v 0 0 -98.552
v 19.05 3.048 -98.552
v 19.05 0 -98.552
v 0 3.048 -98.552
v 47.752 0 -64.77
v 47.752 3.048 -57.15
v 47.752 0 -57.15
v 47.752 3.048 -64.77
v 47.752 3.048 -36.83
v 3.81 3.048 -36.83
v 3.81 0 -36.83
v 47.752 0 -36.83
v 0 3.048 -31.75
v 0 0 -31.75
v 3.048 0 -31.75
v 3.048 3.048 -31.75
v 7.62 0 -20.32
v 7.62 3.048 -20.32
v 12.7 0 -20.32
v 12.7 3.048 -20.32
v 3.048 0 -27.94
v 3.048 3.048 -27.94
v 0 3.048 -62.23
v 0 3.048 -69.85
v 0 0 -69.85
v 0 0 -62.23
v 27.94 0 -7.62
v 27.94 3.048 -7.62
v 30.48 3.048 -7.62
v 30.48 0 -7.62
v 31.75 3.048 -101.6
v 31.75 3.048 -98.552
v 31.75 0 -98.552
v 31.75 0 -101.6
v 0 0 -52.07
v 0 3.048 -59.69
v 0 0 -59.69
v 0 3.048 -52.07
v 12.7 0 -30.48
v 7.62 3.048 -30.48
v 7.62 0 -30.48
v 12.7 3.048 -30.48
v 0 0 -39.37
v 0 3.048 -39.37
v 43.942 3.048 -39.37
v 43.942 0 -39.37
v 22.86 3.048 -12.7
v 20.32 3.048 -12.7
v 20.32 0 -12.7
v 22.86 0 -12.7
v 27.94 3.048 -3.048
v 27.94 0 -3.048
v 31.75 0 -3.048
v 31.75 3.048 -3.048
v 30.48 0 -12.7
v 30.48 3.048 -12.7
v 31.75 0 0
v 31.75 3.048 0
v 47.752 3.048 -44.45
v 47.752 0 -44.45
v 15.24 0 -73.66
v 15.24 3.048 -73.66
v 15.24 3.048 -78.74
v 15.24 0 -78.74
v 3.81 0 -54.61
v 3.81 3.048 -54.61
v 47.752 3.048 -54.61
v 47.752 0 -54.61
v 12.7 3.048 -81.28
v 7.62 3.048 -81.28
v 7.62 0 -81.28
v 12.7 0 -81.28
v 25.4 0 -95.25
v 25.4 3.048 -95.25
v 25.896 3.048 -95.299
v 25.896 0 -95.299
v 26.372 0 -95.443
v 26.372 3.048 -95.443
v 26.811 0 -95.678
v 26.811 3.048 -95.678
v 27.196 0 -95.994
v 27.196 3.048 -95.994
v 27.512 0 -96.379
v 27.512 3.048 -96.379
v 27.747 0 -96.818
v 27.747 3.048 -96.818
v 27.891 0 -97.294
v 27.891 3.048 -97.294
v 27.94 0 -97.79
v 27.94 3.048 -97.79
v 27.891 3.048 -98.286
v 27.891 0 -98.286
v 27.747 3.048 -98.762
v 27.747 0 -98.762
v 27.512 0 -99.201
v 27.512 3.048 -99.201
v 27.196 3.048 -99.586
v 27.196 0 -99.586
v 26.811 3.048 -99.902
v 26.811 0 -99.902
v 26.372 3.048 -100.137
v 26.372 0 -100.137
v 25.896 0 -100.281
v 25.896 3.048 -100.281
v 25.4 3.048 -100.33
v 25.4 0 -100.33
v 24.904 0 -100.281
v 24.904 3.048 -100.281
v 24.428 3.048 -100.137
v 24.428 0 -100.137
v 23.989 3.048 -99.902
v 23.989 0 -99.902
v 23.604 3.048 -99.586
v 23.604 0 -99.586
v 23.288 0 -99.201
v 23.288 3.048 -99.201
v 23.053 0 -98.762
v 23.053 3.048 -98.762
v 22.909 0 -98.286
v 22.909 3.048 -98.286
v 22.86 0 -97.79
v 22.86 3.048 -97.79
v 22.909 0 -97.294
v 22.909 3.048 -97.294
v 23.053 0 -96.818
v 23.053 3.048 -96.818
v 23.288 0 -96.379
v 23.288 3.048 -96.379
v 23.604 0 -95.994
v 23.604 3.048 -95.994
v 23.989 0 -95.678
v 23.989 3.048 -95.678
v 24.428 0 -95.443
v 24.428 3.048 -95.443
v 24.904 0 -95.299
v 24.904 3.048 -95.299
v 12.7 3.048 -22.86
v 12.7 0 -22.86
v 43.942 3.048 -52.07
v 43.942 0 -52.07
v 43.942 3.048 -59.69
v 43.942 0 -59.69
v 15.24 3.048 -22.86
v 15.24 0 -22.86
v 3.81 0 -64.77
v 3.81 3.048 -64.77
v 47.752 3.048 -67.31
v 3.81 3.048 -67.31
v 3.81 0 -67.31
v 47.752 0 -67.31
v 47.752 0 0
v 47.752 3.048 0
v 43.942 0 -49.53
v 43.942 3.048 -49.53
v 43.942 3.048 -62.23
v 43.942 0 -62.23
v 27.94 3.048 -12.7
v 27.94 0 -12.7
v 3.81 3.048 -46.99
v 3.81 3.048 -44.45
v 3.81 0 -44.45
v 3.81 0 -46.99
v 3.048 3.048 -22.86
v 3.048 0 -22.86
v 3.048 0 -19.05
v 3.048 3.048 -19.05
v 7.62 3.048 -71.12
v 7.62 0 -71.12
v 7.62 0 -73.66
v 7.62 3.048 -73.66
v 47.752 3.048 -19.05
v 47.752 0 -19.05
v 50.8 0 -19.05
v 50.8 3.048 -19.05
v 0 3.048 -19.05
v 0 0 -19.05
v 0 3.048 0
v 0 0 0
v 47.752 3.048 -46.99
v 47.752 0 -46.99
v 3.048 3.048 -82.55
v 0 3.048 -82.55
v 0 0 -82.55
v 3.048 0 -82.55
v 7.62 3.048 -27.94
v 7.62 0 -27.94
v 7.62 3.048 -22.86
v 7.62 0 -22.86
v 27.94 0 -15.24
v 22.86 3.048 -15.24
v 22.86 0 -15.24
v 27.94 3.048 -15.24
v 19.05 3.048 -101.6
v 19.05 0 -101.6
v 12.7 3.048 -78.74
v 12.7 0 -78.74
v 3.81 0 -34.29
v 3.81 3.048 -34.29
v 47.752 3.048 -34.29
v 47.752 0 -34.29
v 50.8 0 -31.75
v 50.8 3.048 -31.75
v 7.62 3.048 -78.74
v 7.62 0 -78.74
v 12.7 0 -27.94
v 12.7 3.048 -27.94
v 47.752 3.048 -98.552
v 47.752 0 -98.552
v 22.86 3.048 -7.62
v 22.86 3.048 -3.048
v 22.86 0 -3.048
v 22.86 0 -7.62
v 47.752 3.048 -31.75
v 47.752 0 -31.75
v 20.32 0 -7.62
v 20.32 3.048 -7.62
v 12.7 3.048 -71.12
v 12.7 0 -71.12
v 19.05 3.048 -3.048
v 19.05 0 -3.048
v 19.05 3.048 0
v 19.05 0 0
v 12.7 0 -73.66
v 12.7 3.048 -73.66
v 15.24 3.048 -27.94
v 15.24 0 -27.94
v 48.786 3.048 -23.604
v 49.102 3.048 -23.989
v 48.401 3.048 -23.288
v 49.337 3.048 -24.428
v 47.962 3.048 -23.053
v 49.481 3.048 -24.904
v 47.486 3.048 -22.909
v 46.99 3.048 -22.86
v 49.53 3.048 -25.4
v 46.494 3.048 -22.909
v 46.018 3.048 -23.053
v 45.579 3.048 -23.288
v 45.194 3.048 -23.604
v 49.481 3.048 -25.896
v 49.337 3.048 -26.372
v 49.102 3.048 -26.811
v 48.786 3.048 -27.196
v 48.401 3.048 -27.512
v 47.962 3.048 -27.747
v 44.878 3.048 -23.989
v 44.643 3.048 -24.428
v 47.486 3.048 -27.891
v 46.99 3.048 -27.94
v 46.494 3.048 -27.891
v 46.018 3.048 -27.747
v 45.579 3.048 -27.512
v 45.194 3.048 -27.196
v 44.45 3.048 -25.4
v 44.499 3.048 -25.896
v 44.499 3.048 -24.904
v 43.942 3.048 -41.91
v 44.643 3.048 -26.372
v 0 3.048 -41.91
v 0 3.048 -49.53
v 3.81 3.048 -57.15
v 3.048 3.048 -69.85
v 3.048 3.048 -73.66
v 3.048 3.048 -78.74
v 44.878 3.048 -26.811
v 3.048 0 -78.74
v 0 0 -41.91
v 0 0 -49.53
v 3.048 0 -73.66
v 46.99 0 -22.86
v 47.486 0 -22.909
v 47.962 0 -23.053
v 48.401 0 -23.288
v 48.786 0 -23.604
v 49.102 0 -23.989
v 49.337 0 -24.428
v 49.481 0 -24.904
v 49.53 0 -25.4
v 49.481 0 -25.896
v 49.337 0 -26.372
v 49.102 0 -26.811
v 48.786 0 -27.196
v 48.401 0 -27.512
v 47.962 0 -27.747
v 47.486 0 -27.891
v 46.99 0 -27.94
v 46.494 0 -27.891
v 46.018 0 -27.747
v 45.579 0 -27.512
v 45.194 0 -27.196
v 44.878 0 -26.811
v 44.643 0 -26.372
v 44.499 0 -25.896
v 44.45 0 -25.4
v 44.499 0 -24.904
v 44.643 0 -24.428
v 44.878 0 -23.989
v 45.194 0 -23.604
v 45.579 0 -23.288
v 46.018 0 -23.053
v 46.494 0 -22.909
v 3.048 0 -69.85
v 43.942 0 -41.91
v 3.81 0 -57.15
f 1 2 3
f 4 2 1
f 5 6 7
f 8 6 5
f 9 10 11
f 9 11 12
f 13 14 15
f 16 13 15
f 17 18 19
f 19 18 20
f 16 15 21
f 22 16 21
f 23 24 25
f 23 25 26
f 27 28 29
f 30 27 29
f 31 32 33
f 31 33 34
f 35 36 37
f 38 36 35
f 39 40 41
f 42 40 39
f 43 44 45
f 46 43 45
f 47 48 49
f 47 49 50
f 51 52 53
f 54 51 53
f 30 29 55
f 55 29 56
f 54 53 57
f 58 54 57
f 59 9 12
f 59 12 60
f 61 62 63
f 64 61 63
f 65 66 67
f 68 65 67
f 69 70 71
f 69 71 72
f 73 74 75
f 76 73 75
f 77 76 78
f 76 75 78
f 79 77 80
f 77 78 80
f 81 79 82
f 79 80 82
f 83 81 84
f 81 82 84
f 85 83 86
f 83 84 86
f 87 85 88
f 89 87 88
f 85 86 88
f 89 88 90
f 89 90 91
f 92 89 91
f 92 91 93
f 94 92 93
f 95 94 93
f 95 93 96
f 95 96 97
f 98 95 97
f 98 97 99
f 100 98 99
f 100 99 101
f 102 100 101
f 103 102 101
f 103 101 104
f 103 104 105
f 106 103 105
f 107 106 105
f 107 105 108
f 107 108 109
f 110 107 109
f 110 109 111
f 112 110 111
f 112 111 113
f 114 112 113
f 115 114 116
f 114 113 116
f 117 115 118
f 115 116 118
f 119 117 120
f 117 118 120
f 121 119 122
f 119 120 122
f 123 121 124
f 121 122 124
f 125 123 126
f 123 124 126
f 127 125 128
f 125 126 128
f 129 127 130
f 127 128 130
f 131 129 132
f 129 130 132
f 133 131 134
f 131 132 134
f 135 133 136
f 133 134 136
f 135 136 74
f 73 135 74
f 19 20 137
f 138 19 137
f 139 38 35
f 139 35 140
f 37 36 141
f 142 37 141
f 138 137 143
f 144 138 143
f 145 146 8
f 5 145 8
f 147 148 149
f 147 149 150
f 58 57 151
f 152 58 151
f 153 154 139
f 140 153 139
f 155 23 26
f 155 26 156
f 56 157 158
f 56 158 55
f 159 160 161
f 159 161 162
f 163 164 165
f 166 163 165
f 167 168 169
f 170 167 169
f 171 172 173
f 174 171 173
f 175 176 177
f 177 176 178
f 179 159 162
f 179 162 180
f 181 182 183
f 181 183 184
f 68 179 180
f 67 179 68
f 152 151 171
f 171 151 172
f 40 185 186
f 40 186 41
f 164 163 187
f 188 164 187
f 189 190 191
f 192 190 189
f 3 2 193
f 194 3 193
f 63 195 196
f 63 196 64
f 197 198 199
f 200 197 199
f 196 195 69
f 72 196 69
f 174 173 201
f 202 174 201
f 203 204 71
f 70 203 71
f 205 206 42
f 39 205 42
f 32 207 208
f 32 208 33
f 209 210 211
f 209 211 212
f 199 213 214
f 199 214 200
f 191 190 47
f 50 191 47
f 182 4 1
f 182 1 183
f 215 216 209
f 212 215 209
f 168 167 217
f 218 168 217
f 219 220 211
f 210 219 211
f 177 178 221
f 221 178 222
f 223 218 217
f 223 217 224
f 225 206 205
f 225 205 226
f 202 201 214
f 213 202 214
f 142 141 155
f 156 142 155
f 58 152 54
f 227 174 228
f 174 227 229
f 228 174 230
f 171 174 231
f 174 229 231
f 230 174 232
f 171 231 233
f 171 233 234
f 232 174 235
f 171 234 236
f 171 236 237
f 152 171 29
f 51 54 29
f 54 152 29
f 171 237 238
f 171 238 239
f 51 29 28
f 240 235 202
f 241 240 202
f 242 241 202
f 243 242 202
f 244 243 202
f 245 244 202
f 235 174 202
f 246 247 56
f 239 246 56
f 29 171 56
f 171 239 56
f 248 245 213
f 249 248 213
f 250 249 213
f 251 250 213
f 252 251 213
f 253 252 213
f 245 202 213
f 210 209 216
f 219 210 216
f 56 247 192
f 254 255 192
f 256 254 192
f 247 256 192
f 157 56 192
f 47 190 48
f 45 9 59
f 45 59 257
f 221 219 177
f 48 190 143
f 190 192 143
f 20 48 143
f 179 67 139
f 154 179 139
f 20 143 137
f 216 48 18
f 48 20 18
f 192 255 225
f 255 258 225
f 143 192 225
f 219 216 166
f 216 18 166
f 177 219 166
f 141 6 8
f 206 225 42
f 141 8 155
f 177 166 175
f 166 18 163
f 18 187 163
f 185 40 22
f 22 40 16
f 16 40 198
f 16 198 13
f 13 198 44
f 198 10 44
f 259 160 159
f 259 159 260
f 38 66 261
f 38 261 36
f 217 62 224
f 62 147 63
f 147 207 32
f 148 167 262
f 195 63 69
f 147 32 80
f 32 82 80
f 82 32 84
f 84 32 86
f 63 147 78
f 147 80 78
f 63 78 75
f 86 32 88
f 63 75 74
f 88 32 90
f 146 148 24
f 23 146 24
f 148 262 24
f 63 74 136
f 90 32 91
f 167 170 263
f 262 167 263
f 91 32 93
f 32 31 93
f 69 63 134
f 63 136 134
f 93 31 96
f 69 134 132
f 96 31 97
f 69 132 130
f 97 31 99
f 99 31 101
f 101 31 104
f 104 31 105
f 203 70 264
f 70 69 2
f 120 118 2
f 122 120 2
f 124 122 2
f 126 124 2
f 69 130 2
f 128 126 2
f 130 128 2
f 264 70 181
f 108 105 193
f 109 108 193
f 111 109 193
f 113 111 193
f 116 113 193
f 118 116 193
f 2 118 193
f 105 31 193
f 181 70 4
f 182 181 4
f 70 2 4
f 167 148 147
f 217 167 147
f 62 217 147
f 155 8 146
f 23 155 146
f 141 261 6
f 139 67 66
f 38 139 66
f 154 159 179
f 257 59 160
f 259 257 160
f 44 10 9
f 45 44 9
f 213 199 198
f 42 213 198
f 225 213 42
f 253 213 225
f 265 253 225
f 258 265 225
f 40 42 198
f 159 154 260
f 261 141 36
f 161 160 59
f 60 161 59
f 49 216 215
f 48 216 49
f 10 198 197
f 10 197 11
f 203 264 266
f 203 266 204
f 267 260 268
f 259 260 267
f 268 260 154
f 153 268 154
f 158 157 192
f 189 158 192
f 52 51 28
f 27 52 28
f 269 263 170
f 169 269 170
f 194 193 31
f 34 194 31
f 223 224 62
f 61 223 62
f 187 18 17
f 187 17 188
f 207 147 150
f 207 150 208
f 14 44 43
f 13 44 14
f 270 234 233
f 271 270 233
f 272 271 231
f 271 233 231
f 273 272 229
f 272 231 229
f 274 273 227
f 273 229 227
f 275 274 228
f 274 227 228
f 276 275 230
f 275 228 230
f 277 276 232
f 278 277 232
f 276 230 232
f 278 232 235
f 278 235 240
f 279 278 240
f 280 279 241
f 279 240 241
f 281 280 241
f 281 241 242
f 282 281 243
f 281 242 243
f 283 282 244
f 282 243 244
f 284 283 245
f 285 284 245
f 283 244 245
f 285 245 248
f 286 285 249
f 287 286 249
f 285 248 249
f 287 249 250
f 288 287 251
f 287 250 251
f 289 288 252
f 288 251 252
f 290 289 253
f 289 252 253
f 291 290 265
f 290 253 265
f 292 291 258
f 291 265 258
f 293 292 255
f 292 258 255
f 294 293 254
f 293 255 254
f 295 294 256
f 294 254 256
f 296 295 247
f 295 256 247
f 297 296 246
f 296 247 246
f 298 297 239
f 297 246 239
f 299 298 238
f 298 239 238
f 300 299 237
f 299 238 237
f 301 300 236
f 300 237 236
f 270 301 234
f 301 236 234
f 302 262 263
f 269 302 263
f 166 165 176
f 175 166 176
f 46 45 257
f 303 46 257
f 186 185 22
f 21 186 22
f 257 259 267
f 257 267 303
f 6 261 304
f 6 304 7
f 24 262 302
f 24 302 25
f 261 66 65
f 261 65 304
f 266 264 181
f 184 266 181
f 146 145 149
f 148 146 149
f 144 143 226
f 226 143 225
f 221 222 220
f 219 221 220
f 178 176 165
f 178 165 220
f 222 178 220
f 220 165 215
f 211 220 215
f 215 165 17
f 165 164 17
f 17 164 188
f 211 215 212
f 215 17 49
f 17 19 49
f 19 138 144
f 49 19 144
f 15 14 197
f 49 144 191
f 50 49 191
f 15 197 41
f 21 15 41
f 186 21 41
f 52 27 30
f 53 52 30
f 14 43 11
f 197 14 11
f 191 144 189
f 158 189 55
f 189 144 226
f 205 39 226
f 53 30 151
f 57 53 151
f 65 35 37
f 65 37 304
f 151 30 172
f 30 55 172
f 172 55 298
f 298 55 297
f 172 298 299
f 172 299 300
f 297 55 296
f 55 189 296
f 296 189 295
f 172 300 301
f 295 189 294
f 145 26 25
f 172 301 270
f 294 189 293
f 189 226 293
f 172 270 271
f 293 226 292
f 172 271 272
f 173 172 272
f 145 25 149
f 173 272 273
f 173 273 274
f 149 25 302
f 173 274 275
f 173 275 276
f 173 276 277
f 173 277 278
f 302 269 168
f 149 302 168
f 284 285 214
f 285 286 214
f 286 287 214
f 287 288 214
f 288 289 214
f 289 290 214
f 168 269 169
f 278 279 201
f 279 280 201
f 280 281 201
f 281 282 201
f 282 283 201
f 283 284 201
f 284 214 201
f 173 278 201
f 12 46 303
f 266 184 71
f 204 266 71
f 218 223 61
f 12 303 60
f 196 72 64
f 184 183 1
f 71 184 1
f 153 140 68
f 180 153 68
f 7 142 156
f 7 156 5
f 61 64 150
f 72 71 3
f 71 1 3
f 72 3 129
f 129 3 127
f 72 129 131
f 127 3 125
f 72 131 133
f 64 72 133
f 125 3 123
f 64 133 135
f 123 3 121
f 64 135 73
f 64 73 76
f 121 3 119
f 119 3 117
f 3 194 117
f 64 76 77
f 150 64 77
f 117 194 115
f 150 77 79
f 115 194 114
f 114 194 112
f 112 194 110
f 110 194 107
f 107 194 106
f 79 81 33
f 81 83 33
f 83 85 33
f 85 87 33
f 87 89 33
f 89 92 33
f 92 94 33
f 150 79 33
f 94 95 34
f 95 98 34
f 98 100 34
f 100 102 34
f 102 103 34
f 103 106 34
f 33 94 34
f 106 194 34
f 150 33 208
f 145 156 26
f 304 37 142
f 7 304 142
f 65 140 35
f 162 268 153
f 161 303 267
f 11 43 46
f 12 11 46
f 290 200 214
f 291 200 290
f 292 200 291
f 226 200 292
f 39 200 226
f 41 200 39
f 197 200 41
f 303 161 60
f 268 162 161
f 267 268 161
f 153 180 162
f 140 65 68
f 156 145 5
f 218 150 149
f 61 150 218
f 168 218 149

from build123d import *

# Parameters (mm, degrees)
BOSS_EXTRUDE1_DEPTH = 3.048
SKETCH2_W           = 4.572
SKETCH2_H           = 5.08
SKETCH2_W_2         = 5.08
SKETCH2_H_2         = 2.54
SKETCH2_W_3         = 2.54
SKETCH2_H_3         = 4.572
SKETCH2_R           = 2.54
CUT_EXTRUDE1_DEPTH  = 3.048
SKETCH3_W           = 12.7
SKETCH3_H           = 3.048
SKETCH3_W_2         = 44.704
SKETCH3_H_2         = 12.7
BOSS_EXTRUDE2_DEPTH = 3.048
BOSS_EXTRUDE3_START = -3.048
SKETCH4_R           = 2.54
BOSS_EXTRUDE3_DEPTH = 3.048
SKETCH5_R           = 2.54
SKETCH5_W           = 5.08
SKETCH5_H           = 2.54
SKETCH5_W_2         = 4.572
SKETCH5_H_2         = 5.08
SKETCH5_W_3         = 2.54
SKETCH5_W_4         = 43.942
CUT_EXTRUDE2_DEPTH  = 114.63313911


with BuildPart() as part:
    # Sketch1 → Boss-Extrude1 (new body)
    with BuildSketch(Plane(origin=(0, 0, 0), x_dir=(1, 0, 0), z_dir=(0, 1, 0))):
        Polygon((0, 19.05), (0, 0), (19.05, 0), (19.05, 3.048), (31.75, 3.048), (31.75, 0), (47.752, 0), (47.752, 19.05), (50.8, 19.05), (50.8, 31.75), (47.752, 31.75), (47.752, 47.752), (31.75, 47.752), (31.75, 50.8), (19.05, 50.8), (19.05, 47.752), (0, 47.752), (0, 31.75), (3.048, 31.75), (3.048, 19.05), align=None)
    extrude(amount=BOSS_EXTRUDE1_DEPTH)

    # Sketch2 → Cut-Extrude1 (cut)
    with BuildSketch(Plane(origin=(0, 3.048, 0), x_dir=(1, 0, 0), z_dir=(0, 1, 0))):
        with Locations((5.334, 25.4)):
            Rectangle(SKETCH2_W, SKETCH2_H)
        with Locations((10.16, 25.4)):
            Rectangle(SKETCH2_W_2, SKETCH2_H)
        with Locations((10.16, 29.21)):
            Rectangle(SKETCH2_W_2, SKETCH2_H_2)
        with Locations((13.97, 25.4)):
            Rectangle(SKETCH2_W_3, SKETCH2_H)
        with Locations((10.16, 21.59)):
            Rectangle(SKETCH2_W_2, SKETCH2_H_2)
        with Locations((25.4, 13.97)):
            Rectangle(SKETCH2_W_2, SKETCH2_H_2)
        with Locations((25.4, 10.16)):
            Rectangle(SKETCH2_W_2, SKETCH2_H)
        with Locations((29.21, 10.16)):
            Rectangle(SKETCH2_W_3, SKETCH2_H)
        with Locations((21.59, 10.16)):
            Rectangle(SKETCH2_W_3, SKETCH2_H)
        with Locations((25.4, 5.334)):
            Rectangle(SKETCH2_W_2, SKETCH2_H_3)
        with Locations(Location((46.99, 25.4, 0), (0, 0, 270))):
            Circle(SKETCH2_R)
        with Locations(Location((25.4, 46.99, 0), (0, 0, 270))):
            Circle(SKETCH2_R)
    extrude(amount=-CUT_EXTRUDE1_DEPTH, mode=Mode.SUBTRACT)

    # Sketch3 → Boss-Extrude2 (add)
    with BuildSketch(Plane(origin=(0, 3.048, 0), x_dir=(1, 0, 0), z_dir=(0, 1, 0))):
        with Locations((25.4, 100.076)):
            Rectangle(SKETCH3_W, SKETCH3_H)
        Polygon((3.048, 82.55), (47.752, 82.55), (47.752, 98.552), (31.75, 98.552), (19.05, 98.552), (0, 98.552), (0, 82.55), align=None)
        with Locations((25.4, 76.2)):
            Rectangle(SKETCH3_W_2, SKETCH3_H_2)
        Polygon((0, 69.85), (0, 47.752), (19.05, 47.752), (19.05, 50.8), (31.75, 50.8), (31.75, 47.752), (47.752, 47.752), (47.752, 69.85), (3.048, 69.85), align=None)
    extrude(amount=-BOSS_EXTRUDE2_DEPTH)

    # Sketch4 → Boss-Extrude3 (add)
    with BuildSketch(Plane(origin=(0, 0, 0), x_dir=(-1, 0, 0), z_dir=(0, -1, 0)).offset(BOSS_EXTRUDE3_START)):
        with Locations((-25.4, 46.99)):
            Circle(SKETCH4_R)
    extrude(amount=BOSS_EXTRUDE3_DEPTH)

    # Sketch5 → Cut-Extrude2 (cut, through all)
    with BuildSketch(Plane(origin=(0, 3.048, 0), x_dir=(1, 0, 0), z_dir=(0, 1, 0))):
        with Locations(Location((25.4, 97.79, 0), (0, 0, 270))):
            Circle(SKETCH5_R)
        with Locations((10.16, 80.01)):
            Rectangle(SKETCH5_W, SKETCH5_H)
        with Locations((5.334, 76.2)):
            Rectangle(SKETCH5_W_2, SKETCH5_H_2)
        with Locations((10.16, 76.2)):
            Rectangle(SKETCH5_W, SKETCH5_H_2)
        with Locations((13.97, 76.2)):
            Rectangle(SKETCH5_W_3, SKETCH5_H_2)
        with Locations((10.16, 72.39)):
            Rectangle(SKETCH5_W, SKETCH5_H)
        with Locations((25.781, 66.04)):
            Rectangle(SKETCH5_W_4, SKETCH5_H)
        with Locations((21.971, 60.96)):
            Rectangle(SKETCH5_W_4, SKETCH5_H)
        with Locations((25.781, 55.88)):
            Rectangle(SKETCH5_W_4, SKETCH5_H)
        with Locations((21.971, 50.8)):
            Rectangle(SKETCH5_W_4, SKETCH5_H)
        with Locations((25.781, 45.72)):
            Rectangle(SKETCH5_W_4, SKETCH5_H)
        with Locations((21.971, 40.64)):
            Rectangle(SKETCH5_W_4, SKETCH5_H)
        with Locations((25.781, 35.56)):
            Rectangle(SKETCH5_W_4, SKETCH5_H)
    extrude(amount=-CUT_EXTRUDE2_DEPTH, mode=Mode.SUBTRACT)


solid = part.part
